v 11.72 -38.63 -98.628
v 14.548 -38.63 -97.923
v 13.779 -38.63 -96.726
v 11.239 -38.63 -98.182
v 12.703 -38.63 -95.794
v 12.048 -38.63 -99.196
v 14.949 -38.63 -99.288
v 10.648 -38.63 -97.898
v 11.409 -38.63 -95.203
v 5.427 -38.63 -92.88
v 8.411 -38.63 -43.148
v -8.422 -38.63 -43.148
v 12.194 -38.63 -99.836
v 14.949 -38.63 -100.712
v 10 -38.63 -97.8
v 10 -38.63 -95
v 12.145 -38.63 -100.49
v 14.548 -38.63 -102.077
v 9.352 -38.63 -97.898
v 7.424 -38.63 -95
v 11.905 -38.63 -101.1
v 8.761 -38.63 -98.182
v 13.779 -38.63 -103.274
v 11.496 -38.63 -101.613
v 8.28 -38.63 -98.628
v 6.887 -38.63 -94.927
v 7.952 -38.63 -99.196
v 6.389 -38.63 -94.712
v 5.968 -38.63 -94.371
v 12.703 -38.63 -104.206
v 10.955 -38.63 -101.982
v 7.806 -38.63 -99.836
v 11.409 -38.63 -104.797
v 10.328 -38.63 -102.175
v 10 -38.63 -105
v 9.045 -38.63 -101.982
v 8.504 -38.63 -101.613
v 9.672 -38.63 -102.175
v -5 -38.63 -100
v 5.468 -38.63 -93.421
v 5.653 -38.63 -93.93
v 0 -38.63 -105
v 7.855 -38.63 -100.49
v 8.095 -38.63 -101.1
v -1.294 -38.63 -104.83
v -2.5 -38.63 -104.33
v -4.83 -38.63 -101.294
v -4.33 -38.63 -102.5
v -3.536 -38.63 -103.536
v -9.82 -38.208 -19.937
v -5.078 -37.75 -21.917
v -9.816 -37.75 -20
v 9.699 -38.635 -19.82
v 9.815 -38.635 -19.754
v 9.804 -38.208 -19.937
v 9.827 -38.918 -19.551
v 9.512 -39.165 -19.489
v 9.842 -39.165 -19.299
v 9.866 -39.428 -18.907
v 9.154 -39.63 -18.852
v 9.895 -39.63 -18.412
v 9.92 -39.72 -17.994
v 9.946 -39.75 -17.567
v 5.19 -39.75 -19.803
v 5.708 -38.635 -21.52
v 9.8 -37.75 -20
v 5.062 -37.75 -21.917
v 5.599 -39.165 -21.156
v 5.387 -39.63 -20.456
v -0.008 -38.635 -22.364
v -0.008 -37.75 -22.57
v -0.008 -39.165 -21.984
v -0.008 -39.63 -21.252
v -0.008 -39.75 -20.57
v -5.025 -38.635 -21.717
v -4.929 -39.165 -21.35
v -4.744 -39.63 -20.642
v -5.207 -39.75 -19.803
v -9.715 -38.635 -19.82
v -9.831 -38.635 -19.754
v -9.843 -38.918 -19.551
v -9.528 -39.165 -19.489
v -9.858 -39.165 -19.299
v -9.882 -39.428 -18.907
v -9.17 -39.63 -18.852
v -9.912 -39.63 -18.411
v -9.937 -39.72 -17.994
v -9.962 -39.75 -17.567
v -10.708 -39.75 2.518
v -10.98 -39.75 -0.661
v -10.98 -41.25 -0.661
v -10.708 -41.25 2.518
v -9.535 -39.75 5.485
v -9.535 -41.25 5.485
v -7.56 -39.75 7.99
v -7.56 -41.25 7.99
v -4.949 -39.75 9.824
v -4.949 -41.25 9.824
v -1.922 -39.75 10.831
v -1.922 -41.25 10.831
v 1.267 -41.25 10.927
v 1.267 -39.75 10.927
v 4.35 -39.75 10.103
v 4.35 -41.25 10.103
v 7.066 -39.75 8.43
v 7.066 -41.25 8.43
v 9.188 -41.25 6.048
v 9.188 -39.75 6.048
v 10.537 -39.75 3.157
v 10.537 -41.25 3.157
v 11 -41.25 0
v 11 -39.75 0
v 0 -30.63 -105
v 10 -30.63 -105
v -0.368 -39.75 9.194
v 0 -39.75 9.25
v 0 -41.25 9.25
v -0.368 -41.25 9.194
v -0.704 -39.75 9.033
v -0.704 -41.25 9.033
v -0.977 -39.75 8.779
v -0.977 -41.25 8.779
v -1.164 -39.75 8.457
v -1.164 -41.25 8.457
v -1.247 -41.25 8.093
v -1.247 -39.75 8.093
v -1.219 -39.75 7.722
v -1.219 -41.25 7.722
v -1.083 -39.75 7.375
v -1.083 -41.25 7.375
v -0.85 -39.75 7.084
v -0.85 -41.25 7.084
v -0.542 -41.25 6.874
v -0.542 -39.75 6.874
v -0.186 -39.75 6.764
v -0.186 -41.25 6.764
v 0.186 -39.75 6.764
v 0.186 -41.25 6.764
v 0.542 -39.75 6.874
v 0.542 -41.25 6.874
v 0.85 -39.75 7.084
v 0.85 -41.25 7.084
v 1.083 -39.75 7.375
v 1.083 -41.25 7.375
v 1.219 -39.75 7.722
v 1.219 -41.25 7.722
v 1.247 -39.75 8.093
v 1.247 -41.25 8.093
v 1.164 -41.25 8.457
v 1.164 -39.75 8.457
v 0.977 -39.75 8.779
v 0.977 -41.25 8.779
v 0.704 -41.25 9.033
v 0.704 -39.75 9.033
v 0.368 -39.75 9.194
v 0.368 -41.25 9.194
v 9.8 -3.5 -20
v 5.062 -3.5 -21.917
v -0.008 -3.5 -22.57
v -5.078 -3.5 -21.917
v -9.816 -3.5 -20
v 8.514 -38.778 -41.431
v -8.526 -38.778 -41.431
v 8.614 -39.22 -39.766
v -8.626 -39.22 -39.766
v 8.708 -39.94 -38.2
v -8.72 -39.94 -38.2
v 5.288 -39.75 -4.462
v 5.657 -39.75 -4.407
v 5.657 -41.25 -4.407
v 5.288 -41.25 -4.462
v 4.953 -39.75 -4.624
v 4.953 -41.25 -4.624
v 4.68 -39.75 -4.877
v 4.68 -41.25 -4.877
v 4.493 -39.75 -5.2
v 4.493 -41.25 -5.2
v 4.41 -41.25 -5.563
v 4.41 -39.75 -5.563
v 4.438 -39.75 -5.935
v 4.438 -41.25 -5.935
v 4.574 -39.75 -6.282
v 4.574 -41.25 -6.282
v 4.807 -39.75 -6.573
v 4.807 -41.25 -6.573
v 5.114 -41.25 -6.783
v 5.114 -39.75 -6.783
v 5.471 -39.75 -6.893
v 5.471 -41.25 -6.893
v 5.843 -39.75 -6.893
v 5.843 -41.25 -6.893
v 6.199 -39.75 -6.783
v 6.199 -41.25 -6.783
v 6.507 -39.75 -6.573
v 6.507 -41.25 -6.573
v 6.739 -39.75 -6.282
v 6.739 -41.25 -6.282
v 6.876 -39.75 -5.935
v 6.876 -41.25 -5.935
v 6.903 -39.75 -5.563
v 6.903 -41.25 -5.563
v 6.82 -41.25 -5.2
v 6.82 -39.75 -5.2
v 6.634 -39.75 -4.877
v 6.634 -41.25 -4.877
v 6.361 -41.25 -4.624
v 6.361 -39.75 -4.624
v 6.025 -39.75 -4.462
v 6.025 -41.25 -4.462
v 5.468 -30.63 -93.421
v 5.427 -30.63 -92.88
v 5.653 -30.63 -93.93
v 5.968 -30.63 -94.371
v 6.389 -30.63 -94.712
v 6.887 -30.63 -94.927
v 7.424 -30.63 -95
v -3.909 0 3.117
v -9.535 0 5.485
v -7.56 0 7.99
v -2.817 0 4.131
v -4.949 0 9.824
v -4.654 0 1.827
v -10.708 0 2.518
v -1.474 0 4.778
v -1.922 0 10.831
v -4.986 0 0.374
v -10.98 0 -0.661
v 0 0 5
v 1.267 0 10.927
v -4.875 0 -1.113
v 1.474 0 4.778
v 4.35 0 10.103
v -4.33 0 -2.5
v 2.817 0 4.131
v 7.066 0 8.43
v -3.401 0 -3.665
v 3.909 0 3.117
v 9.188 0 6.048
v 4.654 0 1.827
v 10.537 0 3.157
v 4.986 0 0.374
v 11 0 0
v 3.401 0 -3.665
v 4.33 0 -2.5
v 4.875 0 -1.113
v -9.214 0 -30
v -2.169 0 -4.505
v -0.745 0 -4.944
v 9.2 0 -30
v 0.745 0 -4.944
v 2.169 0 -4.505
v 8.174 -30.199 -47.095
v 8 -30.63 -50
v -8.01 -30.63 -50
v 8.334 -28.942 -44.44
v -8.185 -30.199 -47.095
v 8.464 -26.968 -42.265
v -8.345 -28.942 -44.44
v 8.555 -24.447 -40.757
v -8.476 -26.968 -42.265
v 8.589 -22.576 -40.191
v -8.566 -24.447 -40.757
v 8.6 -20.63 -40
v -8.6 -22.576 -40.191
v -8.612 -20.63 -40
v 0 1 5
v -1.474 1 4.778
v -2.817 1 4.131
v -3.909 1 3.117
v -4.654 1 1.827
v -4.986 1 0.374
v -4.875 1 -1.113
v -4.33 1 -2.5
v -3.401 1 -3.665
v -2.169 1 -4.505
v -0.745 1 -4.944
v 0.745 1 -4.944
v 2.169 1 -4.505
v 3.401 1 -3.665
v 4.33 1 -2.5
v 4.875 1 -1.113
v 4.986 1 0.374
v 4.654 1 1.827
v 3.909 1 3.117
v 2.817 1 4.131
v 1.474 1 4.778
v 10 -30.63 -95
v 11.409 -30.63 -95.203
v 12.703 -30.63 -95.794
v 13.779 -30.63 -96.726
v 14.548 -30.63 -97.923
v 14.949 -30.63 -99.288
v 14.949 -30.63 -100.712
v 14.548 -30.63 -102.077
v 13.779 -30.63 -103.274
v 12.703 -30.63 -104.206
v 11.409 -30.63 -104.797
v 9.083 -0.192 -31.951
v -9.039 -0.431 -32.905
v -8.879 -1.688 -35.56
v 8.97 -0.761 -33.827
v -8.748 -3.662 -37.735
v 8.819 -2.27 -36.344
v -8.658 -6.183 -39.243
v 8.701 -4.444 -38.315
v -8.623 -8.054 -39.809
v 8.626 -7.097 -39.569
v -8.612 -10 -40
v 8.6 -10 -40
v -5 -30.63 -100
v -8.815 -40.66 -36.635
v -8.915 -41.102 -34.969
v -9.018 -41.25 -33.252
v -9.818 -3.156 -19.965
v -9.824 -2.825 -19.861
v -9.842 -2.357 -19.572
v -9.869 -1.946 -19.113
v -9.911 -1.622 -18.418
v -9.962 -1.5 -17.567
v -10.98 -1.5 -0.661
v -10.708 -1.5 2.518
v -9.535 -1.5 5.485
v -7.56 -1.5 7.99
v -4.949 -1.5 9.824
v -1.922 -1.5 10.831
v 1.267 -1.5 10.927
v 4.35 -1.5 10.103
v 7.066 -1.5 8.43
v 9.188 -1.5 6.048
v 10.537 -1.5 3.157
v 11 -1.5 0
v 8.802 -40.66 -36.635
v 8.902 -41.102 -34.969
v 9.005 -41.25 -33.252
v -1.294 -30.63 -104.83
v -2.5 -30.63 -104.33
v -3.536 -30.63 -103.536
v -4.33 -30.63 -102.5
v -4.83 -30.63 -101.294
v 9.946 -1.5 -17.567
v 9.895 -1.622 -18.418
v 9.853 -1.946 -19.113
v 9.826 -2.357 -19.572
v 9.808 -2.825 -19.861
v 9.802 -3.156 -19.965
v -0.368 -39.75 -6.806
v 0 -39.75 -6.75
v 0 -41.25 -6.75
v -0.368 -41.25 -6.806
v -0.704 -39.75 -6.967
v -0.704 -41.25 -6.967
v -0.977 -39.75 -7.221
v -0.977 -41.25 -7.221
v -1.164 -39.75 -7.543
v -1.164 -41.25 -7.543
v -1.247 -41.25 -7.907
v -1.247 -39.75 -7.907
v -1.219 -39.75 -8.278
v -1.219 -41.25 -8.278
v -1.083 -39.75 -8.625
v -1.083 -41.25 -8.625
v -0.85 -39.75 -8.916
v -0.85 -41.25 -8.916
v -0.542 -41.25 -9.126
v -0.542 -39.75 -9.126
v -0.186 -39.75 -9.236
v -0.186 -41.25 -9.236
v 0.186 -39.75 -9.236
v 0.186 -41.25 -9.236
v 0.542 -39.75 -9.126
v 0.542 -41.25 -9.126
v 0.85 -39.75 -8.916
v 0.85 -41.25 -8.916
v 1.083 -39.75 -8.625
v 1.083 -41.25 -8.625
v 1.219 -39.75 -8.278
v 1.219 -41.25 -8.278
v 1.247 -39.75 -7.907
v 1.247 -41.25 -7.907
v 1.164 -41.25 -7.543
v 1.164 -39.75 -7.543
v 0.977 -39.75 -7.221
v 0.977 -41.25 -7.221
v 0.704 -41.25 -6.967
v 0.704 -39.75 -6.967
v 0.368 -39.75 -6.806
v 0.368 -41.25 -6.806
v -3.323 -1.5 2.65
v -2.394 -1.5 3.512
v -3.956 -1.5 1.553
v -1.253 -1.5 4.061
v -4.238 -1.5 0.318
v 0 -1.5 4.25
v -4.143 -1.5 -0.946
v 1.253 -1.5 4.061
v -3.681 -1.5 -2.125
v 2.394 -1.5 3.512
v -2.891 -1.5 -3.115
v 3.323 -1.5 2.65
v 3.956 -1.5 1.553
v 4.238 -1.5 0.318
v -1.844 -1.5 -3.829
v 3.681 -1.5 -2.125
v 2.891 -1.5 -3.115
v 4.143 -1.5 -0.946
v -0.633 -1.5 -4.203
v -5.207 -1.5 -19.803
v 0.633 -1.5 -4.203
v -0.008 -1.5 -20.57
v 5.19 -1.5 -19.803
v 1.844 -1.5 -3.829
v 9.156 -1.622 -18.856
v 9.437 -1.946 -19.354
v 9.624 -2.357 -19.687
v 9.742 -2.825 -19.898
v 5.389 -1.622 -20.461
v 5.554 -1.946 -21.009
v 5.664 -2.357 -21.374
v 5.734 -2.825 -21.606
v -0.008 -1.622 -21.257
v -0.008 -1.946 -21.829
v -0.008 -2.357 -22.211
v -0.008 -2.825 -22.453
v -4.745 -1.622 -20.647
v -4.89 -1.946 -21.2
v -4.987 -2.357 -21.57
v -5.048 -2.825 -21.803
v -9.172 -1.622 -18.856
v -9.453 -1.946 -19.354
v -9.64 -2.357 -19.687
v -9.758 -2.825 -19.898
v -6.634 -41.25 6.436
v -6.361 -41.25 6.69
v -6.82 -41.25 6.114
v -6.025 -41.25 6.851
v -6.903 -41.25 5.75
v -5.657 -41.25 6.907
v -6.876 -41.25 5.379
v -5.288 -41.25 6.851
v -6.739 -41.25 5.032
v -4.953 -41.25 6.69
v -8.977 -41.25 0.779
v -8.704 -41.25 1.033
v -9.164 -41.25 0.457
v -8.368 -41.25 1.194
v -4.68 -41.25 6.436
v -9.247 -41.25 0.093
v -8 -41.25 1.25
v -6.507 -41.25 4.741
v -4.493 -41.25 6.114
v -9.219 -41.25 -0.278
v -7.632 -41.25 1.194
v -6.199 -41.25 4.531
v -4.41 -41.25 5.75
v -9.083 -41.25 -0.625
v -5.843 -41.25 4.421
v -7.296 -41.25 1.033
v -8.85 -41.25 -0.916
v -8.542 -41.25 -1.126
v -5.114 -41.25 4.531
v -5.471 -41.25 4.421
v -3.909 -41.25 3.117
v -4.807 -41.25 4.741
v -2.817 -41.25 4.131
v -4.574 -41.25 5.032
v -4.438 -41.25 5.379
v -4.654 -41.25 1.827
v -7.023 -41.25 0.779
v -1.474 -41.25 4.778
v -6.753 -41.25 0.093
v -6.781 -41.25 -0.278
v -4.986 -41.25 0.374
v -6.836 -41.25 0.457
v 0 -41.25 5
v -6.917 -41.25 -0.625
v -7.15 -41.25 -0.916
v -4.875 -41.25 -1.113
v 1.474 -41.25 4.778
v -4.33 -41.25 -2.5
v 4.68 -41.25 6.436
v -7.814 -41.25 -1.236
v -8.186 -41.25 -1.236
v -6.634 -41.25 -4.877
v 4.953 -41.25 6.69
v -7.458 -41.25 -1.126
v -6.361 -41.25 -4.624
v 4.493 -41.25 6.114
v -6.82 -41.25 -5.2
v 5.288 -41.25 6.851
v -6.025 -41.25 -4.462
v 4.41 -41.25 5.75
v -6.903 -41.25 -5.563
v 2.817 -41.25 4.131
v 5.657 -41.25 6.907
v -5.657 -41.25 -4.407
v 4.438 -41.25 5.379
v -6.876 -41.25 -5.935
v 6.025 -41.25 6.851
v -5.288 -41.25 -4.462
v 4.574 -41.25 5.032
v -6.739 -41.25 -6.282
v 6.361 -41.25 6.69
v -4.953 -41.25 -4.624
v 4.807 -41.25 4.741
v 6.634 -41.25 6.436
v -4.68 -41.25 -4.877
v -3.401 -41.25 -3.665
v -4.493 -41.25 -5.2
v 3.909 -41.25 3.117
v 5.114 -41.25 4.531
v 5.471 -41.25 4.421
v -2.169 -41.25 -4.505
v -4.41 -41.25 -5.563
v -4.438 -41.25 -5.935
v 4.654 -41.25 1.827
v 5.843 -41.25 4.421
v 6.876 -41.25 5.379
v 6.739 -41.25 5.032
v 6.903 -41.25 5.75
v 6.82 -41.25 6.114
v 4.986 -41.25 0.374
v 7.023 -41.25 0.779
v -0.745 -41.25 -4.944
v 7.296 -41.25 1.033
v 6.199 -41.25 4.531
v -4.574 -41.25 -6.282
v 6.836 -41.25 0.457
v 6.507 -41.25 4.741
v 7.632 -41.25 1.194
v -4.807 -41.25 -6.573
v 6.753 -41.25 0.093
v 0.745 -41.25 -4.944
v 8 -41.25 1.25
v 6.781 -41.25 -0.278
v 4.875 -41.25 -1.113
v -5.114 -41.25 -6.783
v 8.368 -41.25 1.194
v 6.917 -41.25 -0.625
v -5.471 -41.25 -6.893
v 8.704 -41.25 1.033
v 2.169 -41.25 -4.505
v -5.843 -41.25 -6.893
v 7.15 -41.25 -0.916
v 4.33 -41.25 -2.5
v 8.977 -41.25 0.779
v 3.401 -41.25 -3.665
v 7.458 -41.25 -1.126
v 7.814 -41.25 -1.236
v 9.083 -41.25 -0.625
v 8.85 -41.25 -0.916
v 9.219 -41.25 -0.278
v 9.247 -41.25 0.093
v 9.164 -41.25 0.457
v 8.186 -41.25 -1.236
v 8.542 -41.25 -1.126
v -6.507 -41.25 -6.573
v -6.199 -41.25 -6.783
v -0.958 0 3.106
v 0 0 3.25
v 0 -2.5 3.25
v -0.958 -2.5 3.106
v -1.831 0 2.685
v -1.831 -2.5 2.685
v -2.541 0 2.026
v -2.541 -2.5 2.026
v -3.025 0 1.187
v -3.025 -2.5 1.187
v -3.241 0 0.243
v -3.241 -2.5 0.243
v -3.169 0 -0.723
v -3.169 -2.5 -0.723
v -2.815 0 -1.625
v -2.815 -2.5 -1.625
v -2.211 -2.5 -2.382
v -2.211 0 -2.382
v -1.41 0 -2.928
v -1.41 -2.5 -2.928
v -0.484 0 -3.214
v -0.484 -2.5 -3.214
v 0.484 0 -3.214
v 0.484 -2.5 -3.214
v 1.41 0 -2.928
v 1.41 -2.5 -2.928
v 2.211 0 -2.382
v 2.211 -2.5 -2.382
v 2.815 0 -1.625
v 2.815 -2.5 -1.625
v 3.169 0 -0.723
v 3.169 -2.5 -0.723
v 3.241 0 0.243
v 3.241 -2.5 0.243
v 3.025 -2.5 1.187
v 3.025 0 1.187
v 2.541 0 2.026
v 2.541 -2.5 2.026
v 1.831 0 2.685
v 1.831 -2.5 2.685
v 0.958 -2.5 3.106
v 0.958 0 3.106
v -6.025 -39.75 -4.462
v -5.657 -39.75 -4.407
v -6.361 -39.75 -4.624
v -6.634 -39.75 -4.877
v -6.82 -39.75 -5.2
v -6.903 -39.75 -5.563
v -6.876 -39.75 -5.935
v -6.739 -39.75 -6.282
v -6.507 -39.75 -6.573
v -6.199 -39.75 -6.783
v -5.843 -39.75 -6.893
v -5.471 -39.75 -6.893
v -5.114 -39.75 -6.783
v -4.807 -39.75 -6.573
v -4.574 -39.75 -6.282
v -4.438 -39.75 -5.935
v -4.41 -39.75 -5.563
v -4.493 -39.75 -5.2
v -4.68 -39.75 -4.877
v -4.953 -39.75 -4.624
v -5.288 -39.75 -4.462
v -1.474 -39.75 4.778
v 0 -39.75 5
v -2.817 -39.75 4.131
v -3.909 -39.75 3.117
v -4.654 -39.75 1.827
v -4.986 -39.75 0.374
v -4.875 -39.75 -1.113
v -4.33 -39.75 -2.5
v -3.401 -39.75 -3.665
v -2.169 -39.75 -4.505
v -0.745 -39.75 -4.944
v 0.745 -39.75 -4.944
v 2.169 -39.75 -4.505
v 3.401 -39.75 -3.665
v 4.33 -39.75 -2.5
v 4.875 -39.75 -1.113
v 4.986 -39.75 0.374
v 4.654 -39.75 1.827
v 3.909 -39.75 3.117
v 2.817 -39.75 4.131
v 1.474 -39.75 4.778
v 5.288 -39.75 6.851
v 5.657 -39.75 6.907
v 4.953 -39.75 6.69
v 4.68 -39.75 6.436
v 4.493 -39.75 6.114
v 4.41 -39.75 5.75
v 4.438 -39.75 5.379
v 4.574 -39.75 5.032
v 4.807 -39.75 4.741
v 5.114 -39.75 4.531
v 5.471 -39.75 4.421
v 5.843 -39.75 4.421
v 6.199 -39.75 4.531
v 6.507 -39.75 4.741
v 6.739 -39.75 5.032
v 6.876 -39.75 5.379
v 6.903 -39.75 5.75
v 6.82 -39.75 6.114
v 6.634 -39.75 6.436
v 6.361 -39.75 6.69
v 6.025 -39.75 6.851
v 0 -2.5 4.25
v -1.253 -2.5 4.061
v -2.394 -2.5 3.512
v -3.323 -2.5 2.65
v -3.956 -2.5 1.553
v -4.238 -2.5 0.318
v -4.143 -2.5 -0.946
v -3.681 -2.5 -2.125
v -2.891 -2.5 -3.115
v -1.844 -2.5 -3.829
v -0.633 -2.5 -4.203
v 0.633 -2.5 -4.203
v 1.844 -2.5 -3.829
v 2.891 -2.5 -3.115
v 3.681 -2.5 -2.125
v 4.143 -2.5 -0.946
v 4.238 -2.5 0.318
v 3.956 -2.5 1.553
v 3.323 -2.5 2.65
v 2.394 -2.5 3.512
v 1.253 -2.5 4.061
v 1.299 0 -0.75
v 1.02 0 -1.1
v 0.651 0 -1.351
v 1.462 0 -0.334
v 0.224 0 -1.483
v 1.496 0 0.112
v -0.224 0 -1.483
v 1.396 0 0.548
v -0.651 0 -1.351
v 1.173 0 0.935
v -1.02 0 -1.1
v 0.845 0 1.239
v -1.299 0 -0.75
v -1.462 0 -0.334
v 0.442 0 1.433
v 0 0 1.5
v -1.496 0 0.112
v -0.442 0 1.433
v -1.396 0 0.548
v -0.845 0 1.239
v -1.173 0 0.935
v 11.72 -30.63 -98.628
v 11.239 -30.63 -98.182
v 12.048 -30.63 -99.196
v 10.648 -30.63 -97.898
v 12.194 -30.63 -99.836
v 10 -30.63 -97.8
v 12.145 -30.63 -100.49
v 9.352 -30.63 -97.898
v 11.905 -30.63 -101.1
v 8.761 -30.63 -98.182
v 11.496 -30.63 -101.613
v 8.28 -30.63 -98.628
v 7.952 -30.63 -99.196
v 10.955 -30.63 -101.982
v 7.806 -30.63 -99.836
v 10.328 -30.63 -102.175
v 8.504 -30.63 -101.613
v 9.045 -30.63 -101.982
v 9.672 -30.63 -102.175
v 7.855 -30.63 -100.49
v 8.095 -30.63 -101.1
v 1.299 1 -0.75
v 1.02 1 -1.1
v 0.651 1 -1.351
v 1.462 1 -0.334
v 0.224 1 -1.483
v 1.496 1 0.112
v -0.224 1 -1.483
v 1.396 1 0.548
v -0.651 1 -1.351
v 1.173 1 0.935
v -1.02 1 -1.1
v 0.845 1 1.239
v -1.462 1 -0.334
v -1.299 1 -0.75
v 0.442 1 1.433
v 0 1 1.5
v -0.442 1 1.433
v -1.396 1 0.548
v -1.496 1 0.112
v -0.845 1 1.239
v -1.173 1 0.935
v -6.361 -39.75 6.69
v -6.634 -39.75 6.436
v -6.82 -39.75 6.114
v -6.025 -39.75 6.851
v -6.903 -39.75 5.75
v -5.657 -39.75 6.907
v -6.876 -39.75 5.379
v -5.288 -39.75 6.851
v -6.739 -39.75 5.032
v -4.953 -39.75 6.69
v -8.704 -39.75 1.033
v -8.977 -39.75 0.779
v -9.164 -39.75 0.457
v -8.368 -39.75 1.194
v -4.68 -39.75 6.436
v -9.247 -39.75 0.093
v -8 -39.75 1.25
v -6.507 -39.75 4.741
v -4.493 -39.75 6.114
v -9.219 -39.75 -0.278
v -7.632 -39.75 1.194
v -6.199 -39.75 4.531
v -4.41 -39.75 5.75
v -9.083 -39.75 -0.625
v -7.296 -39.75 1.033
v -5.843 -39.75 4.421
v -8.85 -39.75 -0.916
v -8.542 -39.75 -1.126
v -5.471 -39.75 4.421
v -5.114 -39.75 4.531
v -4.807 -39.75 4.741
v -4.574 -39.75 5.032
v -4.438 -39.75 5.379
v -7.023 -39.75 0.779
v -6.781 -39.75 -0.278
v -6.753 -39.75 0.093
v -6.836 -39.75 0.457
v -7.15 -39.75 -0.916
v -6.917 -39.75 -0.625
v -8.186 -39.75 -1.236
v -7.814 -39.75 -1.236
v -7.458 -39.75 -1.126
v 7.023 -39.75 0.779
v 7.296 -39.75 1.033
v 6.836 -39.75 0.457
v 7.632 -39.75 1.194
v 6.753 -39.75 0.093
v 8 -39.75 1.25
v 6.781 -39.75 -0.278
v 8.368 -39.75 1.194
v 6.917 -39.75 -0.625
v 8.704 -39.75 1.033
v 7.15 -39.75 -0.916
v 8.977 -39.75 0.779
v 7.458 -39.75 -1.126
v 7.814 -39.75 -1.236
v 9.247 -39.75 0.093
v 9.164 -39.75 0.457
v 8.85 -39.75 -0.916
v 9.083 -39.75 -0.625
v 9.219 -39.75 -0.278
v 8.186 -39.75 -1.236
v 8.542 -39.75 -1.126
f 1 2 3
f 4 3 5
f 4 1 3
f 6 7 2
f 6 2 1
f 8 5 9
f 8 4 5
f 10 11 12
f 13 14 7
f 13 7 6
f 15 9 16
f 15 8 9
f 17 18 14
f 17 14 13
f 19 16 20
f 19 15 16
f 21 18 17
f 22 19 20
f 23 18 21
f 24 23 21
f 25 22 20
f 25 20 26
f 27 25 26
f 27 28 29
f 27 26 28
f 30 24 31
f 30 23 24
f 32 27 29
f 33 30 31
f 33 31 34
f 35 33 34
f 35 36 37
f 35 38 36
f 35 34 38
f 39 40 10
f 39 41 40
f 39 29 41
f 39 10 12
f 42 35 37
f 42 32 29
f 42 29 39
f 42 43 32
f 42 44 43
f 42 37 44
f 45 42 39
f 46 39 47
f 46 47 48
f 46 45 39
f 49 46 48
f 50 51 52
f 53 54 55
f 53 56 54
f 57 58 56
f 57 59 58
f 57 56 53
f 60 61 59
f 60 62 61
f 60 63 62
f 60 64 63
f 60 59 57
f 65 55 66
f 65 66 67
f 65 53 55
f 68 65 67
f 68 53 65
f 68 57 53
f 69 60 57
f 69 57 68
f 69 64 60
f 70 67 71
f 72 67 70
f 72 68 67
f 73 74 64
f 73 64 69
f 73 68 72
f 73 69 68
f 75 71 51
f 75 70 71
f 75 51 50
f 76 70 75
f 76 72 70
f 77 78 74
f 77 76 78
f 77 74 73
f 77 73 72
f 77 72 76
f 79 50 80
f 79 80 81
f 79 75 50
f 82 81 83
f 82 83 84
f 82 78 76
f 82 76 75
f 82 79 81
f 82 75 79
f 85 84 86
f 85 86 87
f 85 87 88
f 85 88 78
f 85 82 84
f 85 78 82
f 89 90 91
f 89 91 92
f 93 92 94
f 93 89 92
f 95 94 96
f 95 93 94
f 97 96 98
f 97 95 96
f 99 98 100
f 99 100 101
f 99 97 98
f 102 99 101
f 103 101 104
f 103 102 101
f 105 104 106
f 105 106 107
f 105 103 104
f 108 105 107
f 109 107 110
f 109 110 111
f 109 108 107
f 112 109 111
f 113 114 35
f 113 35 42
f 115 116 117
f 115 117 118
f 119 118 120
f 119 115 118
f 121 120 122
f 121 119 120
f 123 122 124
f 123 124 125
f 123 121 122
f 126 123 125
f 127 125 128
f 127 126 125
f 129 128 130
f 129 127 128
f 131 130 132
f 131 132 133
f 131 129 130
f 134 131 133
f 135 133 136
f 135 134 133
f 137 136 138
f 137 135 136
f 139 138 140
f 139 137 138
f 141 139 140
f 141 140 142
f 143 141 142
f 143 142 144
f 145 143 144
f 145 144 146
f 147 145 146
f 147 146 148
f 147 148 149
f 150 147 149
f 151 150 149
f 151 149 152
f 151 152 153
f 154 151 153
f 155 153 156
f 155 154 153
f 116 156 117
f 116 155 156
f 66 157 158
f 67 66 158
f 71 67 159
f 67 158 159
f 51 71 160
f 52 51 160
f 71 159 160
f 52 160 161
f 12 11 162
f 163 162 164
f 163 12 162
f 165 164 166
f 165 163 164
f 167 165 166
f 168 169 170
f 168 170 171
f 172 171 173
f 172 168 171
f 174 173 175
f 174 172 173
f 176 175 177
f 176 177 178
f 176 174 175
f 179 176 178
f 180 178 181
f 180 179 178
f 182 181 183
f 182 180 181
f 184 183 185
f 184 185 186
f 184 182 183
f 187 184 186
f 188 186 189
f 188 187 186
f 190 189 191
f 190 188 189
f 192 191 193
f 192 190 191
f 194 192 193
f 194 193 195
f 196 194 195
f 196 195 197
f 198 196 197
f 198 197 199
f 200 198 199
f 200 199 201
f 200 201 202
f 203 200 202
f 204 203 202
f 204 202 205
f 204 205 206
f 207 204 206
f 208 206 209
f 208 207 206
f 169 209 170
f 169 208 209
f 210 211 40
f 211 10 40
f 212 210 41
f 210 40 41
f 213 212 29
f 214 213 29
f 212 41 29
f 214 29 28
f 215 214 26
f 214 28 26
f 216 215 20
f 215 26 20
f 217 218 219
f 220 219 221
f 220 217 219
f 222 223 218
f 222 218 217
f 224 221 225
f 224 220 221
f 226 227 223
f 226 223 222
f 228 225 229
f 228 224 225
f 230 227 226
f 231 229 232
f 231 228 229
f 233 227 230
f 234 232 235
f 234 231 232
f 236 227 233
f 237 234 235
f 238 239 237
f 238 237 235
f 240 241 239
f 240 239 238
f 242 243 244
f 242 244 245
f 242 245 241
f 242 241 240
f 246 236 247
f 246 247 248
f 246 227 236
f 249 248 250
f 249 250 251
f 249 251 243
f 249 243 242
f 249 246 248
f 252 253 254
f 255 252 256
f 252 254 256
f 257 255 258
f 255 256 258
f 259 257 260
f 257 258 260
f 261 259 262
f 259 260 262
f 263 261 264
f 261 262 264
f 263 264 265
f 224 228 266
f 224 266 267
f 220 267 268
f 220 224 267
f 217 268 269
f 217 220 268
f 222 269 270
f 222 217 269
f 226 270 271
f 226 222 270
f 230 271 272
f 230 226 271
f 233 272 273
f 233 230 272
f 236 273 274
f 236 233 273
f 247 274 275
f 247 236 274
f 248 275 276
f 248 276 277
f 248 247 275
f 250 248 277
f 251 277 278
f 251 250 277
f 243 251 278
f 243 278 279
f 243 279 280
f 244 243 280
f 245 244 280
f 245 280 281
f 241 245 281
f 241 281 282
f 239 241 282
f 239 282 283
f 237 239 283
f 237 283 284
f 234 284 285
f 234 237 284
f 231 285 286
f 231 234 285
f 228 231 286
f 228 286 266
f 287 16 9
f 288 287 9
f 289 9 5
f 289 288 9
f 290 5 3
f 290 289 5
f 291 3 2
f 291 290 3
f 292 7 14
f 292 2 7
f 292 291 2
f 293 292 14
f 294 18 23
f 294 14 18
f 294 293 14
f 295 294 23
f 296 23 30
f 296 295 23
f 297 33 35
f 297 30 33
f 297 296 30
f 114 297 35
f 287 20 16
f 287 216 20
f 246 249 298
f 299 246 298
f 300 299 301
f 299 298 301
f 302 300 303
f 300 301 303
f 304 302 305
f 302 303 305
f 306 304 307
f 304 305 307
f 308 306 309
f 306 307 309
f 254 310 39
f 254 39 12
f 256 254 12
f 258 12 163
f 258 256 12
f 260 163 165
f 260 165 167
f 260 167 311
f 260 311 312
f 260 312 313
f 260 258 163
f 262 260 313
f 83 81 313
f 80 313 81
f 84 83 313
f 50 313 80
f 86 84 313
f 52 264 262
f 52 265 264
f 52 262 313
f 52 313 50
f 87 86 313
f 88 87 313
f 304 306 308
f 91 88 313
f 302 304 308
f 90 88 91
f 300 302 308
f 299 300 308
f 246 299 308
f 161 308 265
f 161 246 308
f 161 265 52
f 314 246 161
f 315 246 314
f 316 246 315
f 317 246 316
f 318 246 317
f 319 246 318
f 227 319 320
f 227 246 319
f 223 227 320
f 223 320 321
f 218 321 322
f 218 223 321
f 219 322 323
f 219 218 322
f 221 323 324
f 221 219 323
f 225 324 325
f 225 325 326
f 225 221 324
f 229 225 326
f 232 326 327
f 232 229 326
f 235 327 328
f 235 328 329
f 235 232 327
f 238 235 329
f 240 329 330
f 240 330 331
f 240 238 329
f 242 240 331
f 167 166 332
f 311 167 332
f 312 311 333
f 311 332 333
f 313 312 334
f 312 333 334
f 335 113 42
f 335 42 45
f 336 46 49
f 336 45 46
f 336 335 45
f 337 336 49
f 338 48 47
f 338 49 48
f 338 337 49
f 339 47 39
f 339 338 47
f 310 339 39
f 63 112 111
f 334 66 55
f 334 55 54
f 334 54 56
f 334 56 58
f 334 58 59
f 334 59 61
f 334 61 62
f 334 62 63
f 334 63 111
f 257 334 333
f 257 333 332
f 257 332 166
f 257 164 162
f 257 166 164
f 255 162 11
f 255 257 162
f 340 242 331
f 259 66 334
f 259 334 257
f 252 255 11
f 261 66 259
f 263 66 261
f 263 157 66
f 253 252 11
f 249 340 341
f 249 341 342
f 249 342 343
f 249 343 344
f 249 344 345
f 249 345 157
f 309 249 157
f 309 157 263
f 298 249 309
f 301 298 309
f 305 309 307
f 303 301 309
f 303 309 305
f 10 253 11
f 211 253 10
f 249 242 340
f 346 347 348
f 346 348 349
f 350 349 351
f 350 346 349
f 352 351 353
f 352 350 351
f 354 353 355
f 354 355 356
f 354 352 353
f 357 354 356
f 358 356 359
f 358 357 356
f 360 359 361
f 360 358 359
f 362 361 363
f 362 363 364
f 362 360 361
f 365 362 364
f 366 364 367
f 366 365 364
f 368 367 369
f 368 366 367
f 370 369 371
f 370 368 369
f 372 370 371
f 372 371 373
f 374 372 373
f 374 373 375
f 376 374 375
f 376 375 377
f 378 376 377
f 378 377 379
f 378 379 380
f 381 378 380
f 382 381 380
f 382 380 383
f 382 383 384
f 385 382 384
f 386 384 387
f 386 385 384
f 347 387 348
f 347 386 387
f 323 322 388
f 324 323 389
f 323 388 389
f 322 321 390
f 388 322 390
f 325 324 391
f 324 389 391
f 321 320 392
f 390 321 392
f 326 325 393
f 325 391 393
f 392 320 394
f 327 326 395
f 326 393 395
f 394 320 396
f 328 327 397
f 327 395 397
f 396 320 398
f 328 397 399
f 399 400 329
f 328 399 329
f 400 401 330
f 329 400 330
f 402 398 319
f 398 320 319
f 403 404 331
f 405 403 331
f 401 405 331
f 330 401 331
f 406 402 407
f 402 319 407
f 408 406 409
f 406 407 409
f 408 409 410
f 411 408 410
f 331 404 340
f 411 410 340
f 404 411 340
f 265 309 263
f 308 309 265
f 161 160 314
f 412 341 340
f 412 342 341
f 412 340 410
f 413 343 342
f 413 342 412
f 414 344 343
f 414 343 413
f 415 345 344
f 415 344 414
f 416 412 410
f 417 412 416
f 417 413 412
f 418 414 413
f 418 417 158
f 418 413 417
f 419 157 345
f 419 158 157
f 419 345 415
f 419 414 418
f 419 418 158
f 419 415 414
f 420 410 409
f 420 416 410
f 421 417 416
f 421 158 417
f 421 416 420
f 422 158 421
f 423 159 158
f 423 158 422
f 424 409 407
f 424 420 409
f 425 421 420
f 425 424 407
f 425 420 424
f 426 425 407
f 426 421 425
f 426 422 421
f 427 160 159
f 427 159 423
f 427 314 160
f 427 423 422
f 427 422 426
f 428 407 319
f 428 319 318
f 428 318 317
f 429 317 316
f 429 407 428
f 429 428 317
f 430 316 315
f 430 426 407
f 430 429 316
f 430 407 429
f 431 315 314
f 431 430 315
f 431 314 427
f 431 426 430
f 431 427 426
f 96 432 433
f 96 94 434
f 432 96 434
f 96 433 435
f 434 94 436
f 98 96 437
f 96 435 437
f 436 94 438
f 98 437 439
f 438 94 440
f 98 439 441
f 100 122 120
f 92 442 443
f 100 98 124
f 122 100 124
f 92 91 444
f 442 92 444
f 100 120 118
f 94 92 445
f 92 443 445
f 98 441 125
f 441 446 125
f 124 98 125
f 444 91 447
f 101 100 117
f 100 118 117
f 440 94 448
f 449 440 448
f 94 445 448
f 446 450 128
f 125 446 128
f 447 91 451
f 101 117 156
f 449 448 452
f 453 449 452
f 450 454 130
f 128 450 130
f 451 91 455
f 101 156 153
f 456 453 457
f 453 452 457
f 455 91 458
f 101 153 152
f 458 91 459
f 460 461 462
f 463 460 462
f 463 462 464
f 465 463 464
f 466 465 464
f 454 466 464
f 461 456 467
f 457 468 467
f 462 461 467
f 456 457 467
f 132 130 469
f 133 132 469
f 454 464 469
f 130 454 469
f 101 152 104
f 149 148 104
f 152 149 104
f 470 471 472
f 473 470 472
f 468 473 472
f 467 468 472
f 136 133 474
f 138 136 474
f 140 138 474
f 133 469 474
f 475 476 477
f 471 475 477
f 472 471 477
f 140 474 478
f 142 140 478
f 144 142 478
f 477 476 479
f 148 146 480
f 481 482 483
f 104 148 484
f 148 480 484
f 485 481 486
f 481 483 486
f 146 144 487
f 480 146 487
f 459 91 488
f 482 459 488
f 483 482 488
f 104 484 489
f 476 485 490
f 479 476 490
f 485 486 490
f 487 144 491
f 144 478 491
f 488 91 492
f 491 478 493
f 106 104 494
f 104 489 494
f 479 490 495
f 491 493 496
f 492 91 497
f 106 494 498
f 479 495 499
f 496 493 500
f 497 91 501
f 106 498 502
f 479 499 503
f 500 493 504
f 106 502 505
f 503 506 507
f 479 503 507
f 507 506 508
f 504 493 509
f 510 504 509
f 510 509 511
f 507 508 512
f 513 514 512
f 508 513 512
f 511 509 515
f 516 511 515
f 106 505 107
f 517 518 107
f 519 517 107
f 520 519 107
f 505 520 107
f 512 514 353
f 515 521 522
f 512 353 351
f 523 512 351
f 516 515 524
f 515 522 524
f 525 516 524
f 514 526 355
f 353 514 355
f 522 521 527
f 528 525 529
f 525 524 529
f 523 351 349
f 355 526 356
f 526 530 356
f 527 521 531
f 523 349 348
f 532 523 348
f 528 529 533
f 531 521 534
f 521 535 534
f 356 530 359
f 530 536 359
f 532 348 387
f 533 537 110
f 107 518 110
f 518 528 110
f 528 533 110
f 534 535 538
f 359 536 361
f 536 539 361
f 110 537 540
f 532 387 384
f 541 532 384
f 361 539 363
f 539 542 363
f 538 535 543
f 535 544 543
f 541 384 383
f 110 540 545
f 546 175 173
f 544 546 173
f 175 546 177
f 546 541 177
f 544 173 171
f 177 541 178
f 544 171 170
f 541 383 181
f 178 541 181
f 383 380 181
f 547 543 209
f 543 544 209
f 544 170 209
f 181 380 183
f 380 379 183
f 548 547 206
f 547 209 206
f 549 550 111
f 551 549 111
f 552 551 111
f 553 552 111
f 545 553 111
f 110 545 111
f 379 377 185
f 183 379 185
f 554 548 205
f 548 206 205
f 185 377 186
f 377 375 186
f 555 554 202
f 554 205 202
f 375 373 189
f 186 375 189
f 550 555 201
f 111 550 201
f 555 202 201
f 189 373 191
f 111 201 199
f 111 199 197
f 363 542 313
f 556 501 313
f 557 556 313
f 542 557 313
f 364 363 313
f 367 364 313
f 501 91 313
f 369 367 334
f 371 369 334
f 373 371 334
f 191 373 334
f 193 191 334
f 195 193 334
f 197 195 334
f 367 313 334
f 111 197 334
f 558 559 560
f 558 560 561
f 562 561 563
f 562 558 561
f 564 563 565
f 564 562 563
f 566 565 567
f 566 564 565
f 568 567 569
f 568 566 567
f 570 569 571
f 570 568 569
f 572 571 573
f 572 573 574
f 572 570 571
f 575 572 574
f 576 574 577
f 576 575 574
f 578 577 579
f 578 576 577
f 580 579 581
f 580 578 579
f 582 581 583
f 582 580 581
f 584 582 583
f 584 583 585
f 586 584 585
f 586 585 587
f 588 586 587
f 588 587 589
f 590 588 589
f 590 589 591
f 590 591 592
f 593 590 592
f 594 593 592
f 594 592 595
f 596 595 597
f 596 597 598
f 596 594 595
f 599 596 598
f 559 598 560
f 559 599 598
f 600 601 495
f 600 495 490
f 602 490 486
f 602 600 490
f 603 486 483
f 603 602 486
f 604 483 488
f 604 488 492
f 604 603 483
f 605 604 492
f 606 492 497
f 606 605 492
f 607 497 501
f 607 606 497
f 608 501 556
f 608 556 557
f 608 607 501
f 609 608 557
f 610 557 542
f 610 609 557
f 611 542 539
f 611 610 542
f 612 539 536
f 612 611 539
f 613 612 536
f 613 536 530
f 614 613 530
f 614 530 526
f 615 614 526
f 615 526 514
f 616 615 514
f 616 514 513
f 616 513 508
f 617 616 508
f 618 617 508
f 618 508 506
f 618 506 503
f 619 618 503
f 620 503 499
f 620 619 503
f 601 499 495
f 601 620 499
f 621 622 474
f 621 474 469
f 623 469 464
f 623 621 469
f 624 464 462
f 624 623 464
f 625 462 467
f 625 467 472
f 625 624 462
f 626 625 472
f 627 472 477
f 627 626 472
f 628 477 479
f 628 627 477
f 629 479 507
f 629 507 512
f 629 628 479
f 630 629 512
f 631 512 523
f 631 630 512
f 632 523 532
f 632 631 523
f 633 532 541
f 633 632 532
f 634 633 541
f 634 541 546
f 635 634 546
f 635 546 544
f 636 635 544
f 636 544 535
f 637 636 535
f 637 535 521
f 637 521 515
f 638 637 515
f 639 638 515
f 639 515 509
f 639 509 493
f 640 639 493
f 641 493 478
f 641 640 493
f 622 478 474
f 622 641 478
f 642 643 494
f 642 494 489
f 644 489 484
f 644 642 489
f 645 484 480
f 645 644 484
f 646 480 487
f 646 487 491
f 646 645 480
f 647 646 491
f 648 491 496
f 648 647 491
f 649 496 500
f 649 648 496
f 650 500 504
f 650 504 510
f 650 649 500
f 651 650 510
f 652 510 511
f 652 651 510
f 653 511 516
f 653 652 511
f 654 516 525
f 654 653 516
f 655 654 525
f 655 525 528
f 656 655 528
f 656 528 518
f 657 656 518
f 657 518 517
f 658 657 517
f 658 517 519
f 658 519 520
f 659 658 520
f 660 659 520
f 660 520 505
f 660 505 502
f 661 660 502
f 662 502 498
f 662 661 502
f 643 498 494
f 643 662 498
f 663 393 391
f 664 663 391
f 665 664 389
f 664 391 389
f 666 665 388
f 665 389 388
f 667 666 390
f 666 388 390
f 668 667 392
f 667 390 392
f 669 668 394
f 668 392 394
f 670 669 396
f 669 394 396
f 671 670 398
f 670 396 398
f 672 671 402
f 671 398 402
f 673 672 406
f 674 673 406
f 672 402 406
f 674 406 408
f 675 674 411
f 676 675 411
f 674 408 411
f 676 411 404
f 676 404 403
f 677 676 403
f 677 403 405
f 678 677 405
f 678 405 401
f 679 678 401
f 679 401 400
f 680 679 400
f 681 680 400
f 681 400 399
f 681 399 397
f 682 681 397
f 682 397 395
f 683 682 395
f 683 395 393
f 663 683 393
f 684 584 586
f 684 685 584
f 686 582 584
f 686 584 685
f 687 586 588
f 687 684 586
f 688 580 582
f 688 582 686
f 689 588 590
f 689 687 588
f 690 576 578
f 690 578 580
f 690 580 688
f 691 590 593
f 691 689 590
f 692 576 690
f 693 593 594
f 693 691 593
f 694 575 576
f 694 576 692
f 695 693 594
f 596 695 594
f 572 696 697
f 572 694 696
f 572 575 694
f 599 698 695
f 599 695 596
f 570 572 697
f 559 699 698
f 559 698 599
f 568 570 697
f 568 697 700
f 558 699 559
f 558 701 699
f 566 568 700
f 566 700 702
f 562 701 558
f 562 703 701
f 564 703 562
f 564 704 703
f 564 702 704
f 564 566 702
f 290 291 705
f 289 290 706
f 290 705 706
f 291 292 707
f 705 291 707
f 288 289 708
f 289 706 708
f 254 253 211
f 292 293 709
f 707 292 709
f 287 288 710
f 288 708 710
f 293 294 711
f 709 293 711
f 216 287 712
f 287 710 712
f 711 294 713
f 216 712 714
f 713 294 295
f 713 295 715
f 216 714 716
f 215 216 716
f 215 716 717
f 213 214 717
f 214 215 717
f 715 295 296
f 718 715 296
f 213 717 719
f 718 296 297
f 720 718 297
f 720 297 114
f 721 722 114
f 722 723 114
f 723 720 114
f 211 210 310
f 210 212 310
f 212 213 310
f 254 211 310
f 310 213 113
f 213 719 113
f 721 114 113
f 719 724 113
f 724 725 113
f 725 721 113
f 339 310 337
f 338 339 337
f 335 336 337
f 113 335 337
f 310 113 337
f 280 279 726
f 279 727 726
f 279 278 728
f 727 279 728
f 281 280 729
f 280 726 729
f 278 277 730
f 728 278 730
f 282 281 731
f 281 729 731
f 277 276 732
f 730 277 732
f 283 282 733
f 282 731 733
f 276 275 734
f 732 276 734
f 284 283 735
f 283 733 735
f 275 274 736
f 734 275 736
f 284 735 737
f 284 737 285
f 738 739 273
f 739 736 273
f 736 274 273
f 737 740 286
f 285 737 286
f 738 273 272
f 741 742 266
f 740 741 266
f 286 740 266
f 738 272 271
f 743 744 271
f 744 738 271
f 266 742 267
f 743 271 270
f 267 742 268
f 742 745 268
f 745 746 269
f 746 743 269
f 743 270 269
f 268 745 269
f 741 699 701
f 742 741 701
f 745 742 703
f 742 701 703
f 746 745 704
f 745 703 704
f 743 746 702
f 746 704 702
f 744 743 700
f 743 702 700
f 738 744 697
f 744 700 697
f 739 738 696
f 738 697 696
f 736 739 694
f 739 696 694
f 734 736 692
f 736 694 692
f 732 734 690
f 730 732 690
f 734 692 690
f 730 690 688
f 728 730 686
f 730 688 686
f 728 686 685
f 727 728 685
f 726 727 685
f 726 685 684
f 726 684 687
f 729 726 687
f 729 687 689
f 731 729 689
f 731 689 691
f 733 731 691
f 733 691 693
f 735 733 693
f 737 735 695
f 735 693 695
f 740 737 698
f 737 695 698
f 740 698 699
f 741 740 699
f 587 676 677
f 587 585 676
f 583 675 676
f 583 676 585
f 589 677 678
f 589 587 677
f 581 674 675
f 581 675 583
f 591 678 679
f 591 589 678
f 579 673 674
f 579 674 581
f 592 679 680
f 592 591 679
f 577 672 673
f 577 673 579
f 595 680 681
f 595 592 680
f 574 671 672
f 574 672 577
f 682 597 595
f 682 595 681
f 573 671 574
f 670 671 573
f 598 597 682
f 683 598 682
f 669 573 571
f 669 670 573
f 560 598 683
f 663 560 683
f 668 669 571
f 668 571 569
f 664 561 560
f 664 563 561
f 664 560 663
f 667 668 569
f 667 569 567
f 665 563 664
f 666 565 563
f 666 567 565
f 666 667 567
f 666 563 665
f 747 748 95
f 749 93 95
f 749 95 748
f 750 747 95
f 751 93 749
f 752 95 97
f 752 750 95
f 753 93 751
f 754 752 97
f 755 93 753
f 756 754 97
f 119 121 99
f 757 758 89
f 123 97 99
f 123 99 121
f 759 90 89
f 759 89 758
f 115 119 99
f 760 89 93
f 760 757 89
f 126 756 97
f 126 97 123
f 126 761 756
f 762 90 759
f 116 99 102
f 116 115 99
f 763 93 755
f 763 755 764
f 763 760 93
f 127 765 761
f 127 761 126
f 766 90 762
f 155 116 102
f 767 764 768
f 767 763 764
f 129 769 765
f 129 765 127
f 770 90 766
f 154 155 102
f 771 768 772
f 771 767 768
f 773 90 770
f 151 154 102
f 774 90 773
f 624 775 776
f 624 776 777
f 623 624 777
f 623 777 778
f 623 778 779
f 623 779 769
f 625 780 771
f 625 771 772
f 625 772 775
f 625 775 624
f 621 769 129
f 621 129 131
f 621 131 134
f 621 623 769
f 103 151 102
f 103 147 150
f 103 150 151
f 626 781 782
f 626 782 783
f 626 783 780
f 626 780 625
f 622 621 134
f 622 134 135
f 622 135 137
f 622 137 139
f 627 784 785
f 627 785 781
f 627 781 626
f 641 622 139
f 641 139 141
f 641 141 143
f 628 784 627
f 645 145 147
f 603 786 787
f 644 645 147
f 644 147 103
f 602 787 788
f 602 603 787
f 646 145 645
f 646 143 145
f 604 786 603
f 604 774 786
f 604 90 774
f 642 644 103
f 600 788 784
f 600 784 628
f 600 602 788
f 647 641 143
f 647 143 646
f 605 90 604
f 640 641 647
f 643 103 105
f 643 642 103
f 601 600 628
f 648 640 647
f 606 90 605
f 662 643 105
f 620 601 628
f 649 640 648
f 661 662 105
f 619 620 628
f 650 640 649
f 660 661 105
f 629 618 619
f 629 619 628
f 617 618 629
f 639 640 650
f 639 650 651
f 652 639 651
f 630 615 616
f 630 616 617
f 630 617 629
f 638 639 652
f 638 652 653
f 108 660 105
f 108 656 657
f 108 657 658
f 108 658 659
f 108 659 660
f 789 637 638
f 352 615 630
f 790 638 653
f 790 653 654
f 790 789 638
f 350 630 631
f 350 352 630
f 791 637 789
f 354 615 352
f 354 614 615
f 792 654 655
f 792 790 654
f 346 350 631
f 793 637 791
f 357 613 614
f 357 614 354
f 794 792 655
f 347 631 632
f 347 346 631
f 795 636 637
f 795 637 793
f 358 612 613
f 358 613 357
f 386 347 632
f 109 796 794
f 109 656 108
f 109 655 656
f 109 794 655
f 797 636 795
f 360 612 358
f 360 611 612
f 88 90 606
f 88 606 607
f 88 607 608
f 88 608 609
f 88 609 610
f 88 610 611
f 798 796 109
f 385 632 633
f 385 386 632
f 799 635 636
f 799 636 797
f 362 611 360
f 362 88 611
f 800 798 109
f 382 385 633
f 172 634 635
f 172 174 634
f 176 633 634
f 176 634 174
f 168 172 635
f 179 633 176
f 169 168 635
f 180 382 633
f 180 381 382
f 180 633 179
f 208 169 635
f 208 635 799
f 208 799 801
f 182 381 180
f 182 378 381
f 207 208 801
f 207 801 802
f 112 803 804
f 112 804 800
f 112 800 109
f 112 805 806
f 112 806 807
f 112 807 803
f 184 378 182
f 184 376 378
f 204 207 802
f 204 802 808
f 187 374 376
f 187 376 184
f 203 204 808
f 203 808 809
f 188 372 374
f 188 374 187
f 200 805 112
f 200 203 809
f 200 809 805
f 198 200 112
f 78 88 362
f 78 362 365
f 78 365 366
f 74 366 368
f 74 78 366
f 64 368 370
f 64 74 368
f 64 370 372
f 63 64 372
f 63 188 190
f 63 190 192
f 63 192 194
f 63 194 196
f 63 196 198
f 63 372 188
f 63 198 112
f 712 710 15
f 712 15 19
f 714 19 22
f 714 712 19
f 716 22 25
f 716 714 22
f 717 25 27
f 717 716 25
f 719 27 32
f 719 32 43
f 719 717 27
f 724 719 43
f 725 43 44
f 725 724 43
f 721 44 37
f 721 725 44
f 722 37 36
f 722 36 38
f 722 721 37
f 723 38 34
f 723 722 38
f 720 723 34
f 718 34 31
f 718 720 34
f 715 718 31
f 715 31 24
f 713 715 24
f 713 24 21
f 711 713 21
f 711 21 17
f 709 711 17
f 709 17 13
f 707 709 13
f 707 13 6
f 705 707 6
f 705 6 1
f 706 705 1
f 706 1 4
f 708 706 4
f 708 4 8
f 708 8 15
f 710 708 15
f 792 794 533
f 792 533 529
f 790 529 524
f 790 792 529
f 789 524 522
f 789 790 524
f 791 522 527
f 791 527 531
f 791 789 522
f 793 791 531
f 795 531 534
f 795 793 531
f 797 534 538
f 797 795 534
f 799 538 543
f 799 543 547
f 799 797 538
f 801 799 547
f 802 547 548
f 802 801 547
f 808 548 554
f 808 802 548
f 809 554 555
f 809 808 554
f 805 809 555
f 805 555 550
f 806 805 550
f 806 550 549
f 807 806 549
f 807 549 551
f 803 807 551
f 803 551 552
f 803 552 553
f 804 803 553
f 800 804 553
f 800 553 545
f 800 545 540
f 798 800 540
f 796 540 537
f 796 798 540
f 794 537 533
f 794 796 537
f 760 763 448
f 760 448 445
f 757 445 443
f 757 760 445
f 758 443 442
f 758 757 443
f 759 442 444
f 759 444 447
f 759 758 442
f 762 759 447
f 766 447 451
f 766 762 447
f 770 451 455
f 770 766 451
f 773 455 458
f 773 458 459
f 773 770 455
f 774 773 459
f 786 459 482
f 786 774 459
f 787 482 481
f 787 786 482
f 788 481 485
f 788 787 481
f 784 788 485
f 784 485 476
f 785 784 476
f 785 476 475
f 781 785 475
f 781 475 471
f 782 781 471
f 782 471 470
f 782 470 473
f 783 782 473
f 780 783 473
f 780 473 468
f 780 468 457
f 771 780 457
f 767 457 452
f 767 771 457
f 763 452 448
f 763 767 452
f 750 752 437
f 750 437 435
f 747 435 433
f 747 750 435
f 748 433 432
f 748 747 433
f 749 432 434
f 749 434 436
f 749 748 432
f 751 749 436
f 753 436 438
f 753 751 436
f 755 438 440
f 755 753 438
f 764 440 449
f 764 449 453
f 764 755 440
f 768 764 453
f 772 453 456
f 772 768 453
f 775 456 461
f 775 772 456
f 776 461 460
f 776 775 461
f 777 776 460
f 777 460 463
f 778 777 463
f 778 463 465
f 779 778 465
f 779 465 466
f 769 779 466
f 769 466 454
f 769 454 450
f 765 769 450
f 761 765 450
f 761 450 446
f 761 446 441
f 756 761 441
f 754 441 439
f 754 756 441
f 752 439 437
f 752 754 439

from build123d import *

# Parameters (mm, degrees)
SKETCH3_R           = 4.249999999999999
SKETCH3_R_2         = 2.1999999999999984
BOSS_EXTRUDE2_DEPTH = 1.5
SKETCH3_18_R        = 5
SKETCH3_18_R_2      = 1.5
BOSS_EXTRUDE3_DEPTH = 1
SKETCH3_19_R        = 4.249999999999999
SKETCH3_19_R_2      = 3.250000000000001
BOSS_EXTRUDE4_DEPTH = 2.5
BOSS_EXTRUDE5_START = 39.75
SKETCH3_20_R        = 5
SKETCH3_20_R_2      = 1.2500000000000002
SKETCH3_20_R_3      = 1.2499999999999998
SKETCH3_20_R_4      = 1.2499999999999991
SKETCH3_20_R_5      = 1.2500000000000004
SKETCH3_20_R_6      = 2.1999999999999984
BOSS_EXTRUDE5_DEPTH = 1.5
SKETCH3_21_R        = 2.1999999999999984
BOSS_EXTRUDE6_DEPTH = 41.25
SKETCH3_23_R        = 2.1999999999999984
CUT_EXTRUDE7_DEPTH  = 30.63
CUT_EXTRUDE8_START  = 38.63
SKETCH3_24_R        = 2.1999999999999984
CUT_EXTRUDE8_DEPTH  = 2.62
FILLET5_R           = 10
FILLET6_R           = 10
FILLET7_R           = 2


with BuildPart() as part:
    # Sketch3 → Boss-Extrude2 (new body)
    with BuildSketch(Plane(origin=(0, 0, 0), x_dir=(-1, 0, 0), z_dir=(0, -1, 0))):
        with BuildLine():
            Line((5.000000000000005, 100), (10.980122362164348, 0.6609938818917814))
            ThreePointArc((10.980122362164348, 0.6609938818917814), (0.3306463489834291, -10.995029467532314), (-11, 0))
            Line((-11, 0), (-5.300000000000002, 95.00000000000001))
            Line((-5.300000000000002, 95.00000000000001), (-9.999999999999998, 95.00000000000003))
            ThreePointArc((-9.999999999999998, 95.00000000000003), (-15.00000000000001, 100.00000000000003), (-9.999999999999996, 105.00000000000004))
            Line((-9.999999999999996, 105.00000000000004), (5.6e-16, 105.00000000000003))
            ThreePointArc((5.6e-16, 105.00000000000003), (3.5355339059327497, 103.53553390593275), (5.000000000000005, 100))
        make_face()
        with Locations(Location((0, 0, 0), (0, 0, 270))):
            Circle(SKETCH3_R, mode=Mode.SUBTRACT)
        with Locations(Location((-9.999999999999998, 100.00000000000003, 0), (0, 0, 270))):
            Circle(SKETCH3_R_2, mode=Mode.SUBTRACT)
    extrude(amount=BOSS_EXTRUDE2_DEPTH)

    # Sketch3<18> → Boss-Extrude3 (add)
    with BuildSketch(Plane(origin=(0, 0, 0), x_dir=(-1, 0, 0), z_dir=(0, -1, 0))):
        with Locations(Location((0, 0, 0), (0, 0, 270))):
            Circle(SKETCH3_18_R)
        with Locations(Location((0, 0, 0), (0, 0, 270))):
            Circle(SKETCH3_18_R_2, mode=Mode.SUBTRACT)
    extrude(amount=-BOSS_EXTRUDE3_DEPTH)

    # Sketch3<19> → Boss-Extrude4 (add)
    with BuildSketch(Plane(origin=(0, 0, 0), x_dir=(-1, 0, 0), z_dir=(0, -1, 0))):
        with Locations(Location((0, 0, 0), (0, 0, 270))):
            Circle(SKETCH3_19_R)
        with Locations(Location((0, 0, 0), (0, 0, 270))):
            Circle(SKETCH3_19_R_2, mode=Mode.SUBTRACT)
    extrude(amount=BOSS_EXTRUDE4_DEPTH)



with BuildPart() as body_2:
    # Sketch3<20> → Boss-Extrude5 (new body)
    with BuildSketch(Plane(origin=(0, 0, 0), x_dir=(-1, 0, 0), z_dir=(0, -1, 0)).offset(BOSS_EXTRUDE5_START)):
        with BuildLine():
            Line((5.000000000000005, 100), (10.980122362164348, 0.6609938818917814))
            ThreePointArc((10.980122362164348, 0.6609938818917814), (0.3306463489834291, -10.995029467532314), (-11, 0))
            Line((-11, 0), (-5.300000000000002, 95.00000000000001))
            Line((-5.300000000000002, 95.00000000000001), (-9.999999999999998, 95.00000000000003))
            ThreePointArc((-9.999999999999998, 95.00000000000003), (-15.00000000000001, 100.00000000000003), (-9.999999999999996, 105.00000000000004))
            Line((-9.999999999999996, 105.00000000000004), (5.6e-16, 105.00000000000003))
            ThreePointArc((5.6e-16, 105.00000000000003), (3.5355339059327497, 103.53553390593275), (5.000000000000005, 100))
        make_face()
        with Locations(Location((0, 0, 0), (0, 0, 270))):
            Circle(SKETCH3_20_R, mode=Mode.SUBTRACT)
        with Locations(Location((-8, 0, 0), (0, 0, 270))):
            Circle(SKETCH3_20_R_2, mode=Mode.SUBTRACT)
        with Locations(Location((-5.65685424949238, 5.656854249492384, 0), (0, 0, 270))):
            Circle(SKETCH3_20_R_2, mode=Mode.SUBTRACT)
        with Locations(Location((0, 8.000000000000007, 0), (0, 0, 270))):
            Circle(SKETCH3_20_R_3, mode=Mode.SUBTRACT)
        with Locations(Location((5.656854249492385, 5.656854249492391, 0), (0, 0, 270))):
            Circle(SKETCH3_20_R_2, mode=Mode.SUBTRACT)
        with Locations(Location((8.000000000000009, 9.11e-15, 0), (0, 0, 270))):
            Circle(SKETCH3_20_R_4, mode=Mode.SUBTRACT)
        with Locations(Location((5.656854249492392, -5.656854249492377, 0), (0, 0, 270))):
            Circle(SKETCH3_20_R_2, mode=Mode.SUBTRACT)
        with Locations(Location((1.019e-14, -8, 0), (0, 0, 270))):
            Circle(SKETCH3_20_R_5, mode=Mode.SUBTRACT)
        with Locations(Location((-5.656854249492376, -5.656854249492382, 0), (0, 0, 270))):
            Circle(SKETCH3_20_R_2, mode=Mode.SUBTRACT)
        with Locations(Location((-9.999999999999998, 100.00000000000003, 0), (0, 0, 270))):
            Circle(SKETCH3_20_R_6, mode=Mode.SUBTRACT)
    extrude(amount=BOSS_EXTRUDE5_DEPTH)


with BuildPart() as part_1:
    add(part.part)

    add(body_2.part)  # Boss-Extrude6 merges body 2
    # Sketch3<21> → Boss-Extrude6 (add)
    with BuildSketch(Plane(origin=(0, 0, 0), x_dir=(-1, 0, 0), z_dir=(0, -1, 0))):
        with BuildLine():
            ThreePointArc((5.000000000000007, 100), (3.5355339059327426, 103.53553390593274), (6e-17, 105))
            Line((0, 105.00000000000003), (-9.999999999999996, 105.00000000000004))
            ThreePointArc((-9.999999999999996, 105.00000000000003), (-15.000000000000014, 100.00000000000003), (-9.999999999999998, 95.00000000000003))
            Line((-9.999999999999998, 95.00000000000003), (-5.300000000000002, 95.00000000000001))
            Line((-5.300000000000002, 95.00000000000001), (-9.800000000000002, 20))
            ThreePointArc((-9.800000000000002, 20), (0.00796544916277364, 22.5700311604401), (9.815930898325552, 19.999999999999996))
            Line((9.815930898325552, 19.999999999999996), (5.000000000000004, 100))
        make_face()
        with Locations(Location((-9.999999999999998, 100.00000000000003, 0), (0, 0, 270))):
            Circle(SKETCH3_21_R, mode=Mode.SUBTRACT)
    extrude(amount=BOSS_EXTRUDE6_DEPTH)

    # Sketch3<23> → Cut-Extrude7 (cut)
    with BuildSketch(Plane(origin=(0, 0, 0), x_dir=(-1, 0, 0), z_dir=(0, -1, 0))):
        with BuildLine():
            Line((8.611948173744162, 40), (5.000000000000005, 100))
            ThreePointArc((5.000000000000002, 100), (3.5355339059327484, 103.53553390593275), (5.6e-16, 105.00000000000003))
            Line((0, 105.00000000000003), (-9.999999999999996, 105.00000000000004))
            ThreePointArc((-9.999999999999996, 105.00000000000003), (-15.000000000000014, 100.00000000000003), (-9.999999999999998, 95.00000000000003))
            Line((-9.999999999999998, 95.00000000000003), (-5.300000000000002, 95.00000000000001))
            Line((-5.300000000000002, 95.00000000000001), (-8.600000000000001, 40.00000000000001))
            Line((-8.600000000000003, 40), (8.611948173744162, 40))
        make_face()
        with Locations(Location((-9.999999999999998, 100.00000000000003, 0), (0, 0, 270))):
            Circle(SKETCH3_23_R, mode=Mode.SUBTRACT)
    extrude(amount=CUT_EXTRUDE7_DEPTH, mode=Mode.SUBTRACT)

    # Sketch3<24> → Cut-Extrude8 (cut)
    with BuildSketch(Plane(origin=(0, 0, 0), x_dir=(-1, 0, 0), z_dir=(0, -1, 0)).offset(CUT_EXTRUDE8_START)):
        with BuildLine():
            Line((8.611948173744162, 40), (5.000000000000005, 100))
            ThreePointArc((5.000000000000002, 100), (3.5355339059327484, 103.53553390593275), (5.6e-16, 105.00000000000003))
            Line((0, 105.00000000000003), (-9.999999999999996, 105.00000000000004))
            ThreePointArc((-9.999999999999996, 105.00000000000003), (-15.000000000000014, 100.00000000000003), (-9.999999999999998, 95.00000000000003))
            Line((-9.999999999999998, 95.00000000000003), (-5.300000000000002, 95.00000000000001))
            Line((-5.300000000000002, 95.00000000000001), (-8.600000000000001, 40.00000000000001))
            Line((-8.600000000000003, 40), (8.611948173744162, 40))
        make_face()
        with Locations(Location((-9.999999999999998, 100.00000000000003, 0), (0, 0, 270))):
            Circle(SKETCH3_24_R, mode=Mode.SUBTRACT)
    extrude(amount=CUT_EXTRUDE8_DEPTH, mode=Mode.SUBTRACT)

    # Fillet5
    # the kernel refuses this fillet: 10 mm, written as the material it takes off along each edge
    with BuildSketch(Plane(origin=(33.6, 0, -40), x_dir=(0, -1, 0), z_dir=(-1, 0, 0))) as fillet5_piece_1:
        with BuildLine():
            CenterArc((FILLET5_R, FILLET5_R), FILLET5_R, 180, 90)
            Line((-1.78e-15, FILLET5_R), (-FILLET5_R * 0.02, FILLET5_R))
            Line((-FILLET5_R * 0.02, FILLET5_R), (-FILLET5_R * 0.02, -FILLET5_R * 0.02))
            Line((-FILLET5_R * 0.02, -FILLET5_R * 0.02), (FILLET5_R, -FILLET5_R * 0.02))
            Line((FILLET5_R, -FILLET5_R * 0.02), (FILLET5_R, 0))
        make_face()
    extrude(amount=67.21194817374416, mode=Mode.SUBTRACT)
    with BuildSketch(Plane(origin=(25.470017783037456, -41.25, -40), x_dir=(0, 1, 0), z_dir=(-1, 0, 0))) as fillet5_piece_2:
        with BuildLine():
            CenterArc((10, -6.748007113214982), FILLET5_R, 137.5613237933639, 42.4386762066361)
            Line((0, -6.748007113214982), (-0.20000000000000284, -6.748007113214982))
            Line((-0.20000000000000284, -6.748007113214982), (-0.20000000000000284, 0))
            Line((-0.20000000000000284, 0), (0, 0.20000000000000284))
            ThreePointArc((0, 0.20000000000000284), (1.3100000000000023, 0.20000000000000284), (2.4724000000000004, 0.13496014226429764))
            Line((2.4724000000000004, 0.13496014226429764), (2.6199999999999974, 0))
        make_face()
    extrude(amount=50.95198373981907, mode=Mode.SUBTRACT)

    # Fillet6
    fillet6_edges = [part_1.edges().sort_by_distance(p)[0] for p in [
        (-0.00597408687207945, -30.63, -40),
        (-0.00597408687207945, -38.63, -40),
    ]]
    fillet(fillet6_edges, radius=FILLET6_R)

    # Fillet7
    fillet7_edges = [part_1.edges().sort_by_distance(p)[0] for p in [
        (5.300000000000002, -34.63, -95.00000000000001),
        (-0.00796544916277897, -1.5, -22.570031160440095),
        (-0.00796544916277897, -39.75, -22.570031160440095),
    ]]
    fillet(fillet7_edges, radius=FILLET7_R)


solid = part_1.part
